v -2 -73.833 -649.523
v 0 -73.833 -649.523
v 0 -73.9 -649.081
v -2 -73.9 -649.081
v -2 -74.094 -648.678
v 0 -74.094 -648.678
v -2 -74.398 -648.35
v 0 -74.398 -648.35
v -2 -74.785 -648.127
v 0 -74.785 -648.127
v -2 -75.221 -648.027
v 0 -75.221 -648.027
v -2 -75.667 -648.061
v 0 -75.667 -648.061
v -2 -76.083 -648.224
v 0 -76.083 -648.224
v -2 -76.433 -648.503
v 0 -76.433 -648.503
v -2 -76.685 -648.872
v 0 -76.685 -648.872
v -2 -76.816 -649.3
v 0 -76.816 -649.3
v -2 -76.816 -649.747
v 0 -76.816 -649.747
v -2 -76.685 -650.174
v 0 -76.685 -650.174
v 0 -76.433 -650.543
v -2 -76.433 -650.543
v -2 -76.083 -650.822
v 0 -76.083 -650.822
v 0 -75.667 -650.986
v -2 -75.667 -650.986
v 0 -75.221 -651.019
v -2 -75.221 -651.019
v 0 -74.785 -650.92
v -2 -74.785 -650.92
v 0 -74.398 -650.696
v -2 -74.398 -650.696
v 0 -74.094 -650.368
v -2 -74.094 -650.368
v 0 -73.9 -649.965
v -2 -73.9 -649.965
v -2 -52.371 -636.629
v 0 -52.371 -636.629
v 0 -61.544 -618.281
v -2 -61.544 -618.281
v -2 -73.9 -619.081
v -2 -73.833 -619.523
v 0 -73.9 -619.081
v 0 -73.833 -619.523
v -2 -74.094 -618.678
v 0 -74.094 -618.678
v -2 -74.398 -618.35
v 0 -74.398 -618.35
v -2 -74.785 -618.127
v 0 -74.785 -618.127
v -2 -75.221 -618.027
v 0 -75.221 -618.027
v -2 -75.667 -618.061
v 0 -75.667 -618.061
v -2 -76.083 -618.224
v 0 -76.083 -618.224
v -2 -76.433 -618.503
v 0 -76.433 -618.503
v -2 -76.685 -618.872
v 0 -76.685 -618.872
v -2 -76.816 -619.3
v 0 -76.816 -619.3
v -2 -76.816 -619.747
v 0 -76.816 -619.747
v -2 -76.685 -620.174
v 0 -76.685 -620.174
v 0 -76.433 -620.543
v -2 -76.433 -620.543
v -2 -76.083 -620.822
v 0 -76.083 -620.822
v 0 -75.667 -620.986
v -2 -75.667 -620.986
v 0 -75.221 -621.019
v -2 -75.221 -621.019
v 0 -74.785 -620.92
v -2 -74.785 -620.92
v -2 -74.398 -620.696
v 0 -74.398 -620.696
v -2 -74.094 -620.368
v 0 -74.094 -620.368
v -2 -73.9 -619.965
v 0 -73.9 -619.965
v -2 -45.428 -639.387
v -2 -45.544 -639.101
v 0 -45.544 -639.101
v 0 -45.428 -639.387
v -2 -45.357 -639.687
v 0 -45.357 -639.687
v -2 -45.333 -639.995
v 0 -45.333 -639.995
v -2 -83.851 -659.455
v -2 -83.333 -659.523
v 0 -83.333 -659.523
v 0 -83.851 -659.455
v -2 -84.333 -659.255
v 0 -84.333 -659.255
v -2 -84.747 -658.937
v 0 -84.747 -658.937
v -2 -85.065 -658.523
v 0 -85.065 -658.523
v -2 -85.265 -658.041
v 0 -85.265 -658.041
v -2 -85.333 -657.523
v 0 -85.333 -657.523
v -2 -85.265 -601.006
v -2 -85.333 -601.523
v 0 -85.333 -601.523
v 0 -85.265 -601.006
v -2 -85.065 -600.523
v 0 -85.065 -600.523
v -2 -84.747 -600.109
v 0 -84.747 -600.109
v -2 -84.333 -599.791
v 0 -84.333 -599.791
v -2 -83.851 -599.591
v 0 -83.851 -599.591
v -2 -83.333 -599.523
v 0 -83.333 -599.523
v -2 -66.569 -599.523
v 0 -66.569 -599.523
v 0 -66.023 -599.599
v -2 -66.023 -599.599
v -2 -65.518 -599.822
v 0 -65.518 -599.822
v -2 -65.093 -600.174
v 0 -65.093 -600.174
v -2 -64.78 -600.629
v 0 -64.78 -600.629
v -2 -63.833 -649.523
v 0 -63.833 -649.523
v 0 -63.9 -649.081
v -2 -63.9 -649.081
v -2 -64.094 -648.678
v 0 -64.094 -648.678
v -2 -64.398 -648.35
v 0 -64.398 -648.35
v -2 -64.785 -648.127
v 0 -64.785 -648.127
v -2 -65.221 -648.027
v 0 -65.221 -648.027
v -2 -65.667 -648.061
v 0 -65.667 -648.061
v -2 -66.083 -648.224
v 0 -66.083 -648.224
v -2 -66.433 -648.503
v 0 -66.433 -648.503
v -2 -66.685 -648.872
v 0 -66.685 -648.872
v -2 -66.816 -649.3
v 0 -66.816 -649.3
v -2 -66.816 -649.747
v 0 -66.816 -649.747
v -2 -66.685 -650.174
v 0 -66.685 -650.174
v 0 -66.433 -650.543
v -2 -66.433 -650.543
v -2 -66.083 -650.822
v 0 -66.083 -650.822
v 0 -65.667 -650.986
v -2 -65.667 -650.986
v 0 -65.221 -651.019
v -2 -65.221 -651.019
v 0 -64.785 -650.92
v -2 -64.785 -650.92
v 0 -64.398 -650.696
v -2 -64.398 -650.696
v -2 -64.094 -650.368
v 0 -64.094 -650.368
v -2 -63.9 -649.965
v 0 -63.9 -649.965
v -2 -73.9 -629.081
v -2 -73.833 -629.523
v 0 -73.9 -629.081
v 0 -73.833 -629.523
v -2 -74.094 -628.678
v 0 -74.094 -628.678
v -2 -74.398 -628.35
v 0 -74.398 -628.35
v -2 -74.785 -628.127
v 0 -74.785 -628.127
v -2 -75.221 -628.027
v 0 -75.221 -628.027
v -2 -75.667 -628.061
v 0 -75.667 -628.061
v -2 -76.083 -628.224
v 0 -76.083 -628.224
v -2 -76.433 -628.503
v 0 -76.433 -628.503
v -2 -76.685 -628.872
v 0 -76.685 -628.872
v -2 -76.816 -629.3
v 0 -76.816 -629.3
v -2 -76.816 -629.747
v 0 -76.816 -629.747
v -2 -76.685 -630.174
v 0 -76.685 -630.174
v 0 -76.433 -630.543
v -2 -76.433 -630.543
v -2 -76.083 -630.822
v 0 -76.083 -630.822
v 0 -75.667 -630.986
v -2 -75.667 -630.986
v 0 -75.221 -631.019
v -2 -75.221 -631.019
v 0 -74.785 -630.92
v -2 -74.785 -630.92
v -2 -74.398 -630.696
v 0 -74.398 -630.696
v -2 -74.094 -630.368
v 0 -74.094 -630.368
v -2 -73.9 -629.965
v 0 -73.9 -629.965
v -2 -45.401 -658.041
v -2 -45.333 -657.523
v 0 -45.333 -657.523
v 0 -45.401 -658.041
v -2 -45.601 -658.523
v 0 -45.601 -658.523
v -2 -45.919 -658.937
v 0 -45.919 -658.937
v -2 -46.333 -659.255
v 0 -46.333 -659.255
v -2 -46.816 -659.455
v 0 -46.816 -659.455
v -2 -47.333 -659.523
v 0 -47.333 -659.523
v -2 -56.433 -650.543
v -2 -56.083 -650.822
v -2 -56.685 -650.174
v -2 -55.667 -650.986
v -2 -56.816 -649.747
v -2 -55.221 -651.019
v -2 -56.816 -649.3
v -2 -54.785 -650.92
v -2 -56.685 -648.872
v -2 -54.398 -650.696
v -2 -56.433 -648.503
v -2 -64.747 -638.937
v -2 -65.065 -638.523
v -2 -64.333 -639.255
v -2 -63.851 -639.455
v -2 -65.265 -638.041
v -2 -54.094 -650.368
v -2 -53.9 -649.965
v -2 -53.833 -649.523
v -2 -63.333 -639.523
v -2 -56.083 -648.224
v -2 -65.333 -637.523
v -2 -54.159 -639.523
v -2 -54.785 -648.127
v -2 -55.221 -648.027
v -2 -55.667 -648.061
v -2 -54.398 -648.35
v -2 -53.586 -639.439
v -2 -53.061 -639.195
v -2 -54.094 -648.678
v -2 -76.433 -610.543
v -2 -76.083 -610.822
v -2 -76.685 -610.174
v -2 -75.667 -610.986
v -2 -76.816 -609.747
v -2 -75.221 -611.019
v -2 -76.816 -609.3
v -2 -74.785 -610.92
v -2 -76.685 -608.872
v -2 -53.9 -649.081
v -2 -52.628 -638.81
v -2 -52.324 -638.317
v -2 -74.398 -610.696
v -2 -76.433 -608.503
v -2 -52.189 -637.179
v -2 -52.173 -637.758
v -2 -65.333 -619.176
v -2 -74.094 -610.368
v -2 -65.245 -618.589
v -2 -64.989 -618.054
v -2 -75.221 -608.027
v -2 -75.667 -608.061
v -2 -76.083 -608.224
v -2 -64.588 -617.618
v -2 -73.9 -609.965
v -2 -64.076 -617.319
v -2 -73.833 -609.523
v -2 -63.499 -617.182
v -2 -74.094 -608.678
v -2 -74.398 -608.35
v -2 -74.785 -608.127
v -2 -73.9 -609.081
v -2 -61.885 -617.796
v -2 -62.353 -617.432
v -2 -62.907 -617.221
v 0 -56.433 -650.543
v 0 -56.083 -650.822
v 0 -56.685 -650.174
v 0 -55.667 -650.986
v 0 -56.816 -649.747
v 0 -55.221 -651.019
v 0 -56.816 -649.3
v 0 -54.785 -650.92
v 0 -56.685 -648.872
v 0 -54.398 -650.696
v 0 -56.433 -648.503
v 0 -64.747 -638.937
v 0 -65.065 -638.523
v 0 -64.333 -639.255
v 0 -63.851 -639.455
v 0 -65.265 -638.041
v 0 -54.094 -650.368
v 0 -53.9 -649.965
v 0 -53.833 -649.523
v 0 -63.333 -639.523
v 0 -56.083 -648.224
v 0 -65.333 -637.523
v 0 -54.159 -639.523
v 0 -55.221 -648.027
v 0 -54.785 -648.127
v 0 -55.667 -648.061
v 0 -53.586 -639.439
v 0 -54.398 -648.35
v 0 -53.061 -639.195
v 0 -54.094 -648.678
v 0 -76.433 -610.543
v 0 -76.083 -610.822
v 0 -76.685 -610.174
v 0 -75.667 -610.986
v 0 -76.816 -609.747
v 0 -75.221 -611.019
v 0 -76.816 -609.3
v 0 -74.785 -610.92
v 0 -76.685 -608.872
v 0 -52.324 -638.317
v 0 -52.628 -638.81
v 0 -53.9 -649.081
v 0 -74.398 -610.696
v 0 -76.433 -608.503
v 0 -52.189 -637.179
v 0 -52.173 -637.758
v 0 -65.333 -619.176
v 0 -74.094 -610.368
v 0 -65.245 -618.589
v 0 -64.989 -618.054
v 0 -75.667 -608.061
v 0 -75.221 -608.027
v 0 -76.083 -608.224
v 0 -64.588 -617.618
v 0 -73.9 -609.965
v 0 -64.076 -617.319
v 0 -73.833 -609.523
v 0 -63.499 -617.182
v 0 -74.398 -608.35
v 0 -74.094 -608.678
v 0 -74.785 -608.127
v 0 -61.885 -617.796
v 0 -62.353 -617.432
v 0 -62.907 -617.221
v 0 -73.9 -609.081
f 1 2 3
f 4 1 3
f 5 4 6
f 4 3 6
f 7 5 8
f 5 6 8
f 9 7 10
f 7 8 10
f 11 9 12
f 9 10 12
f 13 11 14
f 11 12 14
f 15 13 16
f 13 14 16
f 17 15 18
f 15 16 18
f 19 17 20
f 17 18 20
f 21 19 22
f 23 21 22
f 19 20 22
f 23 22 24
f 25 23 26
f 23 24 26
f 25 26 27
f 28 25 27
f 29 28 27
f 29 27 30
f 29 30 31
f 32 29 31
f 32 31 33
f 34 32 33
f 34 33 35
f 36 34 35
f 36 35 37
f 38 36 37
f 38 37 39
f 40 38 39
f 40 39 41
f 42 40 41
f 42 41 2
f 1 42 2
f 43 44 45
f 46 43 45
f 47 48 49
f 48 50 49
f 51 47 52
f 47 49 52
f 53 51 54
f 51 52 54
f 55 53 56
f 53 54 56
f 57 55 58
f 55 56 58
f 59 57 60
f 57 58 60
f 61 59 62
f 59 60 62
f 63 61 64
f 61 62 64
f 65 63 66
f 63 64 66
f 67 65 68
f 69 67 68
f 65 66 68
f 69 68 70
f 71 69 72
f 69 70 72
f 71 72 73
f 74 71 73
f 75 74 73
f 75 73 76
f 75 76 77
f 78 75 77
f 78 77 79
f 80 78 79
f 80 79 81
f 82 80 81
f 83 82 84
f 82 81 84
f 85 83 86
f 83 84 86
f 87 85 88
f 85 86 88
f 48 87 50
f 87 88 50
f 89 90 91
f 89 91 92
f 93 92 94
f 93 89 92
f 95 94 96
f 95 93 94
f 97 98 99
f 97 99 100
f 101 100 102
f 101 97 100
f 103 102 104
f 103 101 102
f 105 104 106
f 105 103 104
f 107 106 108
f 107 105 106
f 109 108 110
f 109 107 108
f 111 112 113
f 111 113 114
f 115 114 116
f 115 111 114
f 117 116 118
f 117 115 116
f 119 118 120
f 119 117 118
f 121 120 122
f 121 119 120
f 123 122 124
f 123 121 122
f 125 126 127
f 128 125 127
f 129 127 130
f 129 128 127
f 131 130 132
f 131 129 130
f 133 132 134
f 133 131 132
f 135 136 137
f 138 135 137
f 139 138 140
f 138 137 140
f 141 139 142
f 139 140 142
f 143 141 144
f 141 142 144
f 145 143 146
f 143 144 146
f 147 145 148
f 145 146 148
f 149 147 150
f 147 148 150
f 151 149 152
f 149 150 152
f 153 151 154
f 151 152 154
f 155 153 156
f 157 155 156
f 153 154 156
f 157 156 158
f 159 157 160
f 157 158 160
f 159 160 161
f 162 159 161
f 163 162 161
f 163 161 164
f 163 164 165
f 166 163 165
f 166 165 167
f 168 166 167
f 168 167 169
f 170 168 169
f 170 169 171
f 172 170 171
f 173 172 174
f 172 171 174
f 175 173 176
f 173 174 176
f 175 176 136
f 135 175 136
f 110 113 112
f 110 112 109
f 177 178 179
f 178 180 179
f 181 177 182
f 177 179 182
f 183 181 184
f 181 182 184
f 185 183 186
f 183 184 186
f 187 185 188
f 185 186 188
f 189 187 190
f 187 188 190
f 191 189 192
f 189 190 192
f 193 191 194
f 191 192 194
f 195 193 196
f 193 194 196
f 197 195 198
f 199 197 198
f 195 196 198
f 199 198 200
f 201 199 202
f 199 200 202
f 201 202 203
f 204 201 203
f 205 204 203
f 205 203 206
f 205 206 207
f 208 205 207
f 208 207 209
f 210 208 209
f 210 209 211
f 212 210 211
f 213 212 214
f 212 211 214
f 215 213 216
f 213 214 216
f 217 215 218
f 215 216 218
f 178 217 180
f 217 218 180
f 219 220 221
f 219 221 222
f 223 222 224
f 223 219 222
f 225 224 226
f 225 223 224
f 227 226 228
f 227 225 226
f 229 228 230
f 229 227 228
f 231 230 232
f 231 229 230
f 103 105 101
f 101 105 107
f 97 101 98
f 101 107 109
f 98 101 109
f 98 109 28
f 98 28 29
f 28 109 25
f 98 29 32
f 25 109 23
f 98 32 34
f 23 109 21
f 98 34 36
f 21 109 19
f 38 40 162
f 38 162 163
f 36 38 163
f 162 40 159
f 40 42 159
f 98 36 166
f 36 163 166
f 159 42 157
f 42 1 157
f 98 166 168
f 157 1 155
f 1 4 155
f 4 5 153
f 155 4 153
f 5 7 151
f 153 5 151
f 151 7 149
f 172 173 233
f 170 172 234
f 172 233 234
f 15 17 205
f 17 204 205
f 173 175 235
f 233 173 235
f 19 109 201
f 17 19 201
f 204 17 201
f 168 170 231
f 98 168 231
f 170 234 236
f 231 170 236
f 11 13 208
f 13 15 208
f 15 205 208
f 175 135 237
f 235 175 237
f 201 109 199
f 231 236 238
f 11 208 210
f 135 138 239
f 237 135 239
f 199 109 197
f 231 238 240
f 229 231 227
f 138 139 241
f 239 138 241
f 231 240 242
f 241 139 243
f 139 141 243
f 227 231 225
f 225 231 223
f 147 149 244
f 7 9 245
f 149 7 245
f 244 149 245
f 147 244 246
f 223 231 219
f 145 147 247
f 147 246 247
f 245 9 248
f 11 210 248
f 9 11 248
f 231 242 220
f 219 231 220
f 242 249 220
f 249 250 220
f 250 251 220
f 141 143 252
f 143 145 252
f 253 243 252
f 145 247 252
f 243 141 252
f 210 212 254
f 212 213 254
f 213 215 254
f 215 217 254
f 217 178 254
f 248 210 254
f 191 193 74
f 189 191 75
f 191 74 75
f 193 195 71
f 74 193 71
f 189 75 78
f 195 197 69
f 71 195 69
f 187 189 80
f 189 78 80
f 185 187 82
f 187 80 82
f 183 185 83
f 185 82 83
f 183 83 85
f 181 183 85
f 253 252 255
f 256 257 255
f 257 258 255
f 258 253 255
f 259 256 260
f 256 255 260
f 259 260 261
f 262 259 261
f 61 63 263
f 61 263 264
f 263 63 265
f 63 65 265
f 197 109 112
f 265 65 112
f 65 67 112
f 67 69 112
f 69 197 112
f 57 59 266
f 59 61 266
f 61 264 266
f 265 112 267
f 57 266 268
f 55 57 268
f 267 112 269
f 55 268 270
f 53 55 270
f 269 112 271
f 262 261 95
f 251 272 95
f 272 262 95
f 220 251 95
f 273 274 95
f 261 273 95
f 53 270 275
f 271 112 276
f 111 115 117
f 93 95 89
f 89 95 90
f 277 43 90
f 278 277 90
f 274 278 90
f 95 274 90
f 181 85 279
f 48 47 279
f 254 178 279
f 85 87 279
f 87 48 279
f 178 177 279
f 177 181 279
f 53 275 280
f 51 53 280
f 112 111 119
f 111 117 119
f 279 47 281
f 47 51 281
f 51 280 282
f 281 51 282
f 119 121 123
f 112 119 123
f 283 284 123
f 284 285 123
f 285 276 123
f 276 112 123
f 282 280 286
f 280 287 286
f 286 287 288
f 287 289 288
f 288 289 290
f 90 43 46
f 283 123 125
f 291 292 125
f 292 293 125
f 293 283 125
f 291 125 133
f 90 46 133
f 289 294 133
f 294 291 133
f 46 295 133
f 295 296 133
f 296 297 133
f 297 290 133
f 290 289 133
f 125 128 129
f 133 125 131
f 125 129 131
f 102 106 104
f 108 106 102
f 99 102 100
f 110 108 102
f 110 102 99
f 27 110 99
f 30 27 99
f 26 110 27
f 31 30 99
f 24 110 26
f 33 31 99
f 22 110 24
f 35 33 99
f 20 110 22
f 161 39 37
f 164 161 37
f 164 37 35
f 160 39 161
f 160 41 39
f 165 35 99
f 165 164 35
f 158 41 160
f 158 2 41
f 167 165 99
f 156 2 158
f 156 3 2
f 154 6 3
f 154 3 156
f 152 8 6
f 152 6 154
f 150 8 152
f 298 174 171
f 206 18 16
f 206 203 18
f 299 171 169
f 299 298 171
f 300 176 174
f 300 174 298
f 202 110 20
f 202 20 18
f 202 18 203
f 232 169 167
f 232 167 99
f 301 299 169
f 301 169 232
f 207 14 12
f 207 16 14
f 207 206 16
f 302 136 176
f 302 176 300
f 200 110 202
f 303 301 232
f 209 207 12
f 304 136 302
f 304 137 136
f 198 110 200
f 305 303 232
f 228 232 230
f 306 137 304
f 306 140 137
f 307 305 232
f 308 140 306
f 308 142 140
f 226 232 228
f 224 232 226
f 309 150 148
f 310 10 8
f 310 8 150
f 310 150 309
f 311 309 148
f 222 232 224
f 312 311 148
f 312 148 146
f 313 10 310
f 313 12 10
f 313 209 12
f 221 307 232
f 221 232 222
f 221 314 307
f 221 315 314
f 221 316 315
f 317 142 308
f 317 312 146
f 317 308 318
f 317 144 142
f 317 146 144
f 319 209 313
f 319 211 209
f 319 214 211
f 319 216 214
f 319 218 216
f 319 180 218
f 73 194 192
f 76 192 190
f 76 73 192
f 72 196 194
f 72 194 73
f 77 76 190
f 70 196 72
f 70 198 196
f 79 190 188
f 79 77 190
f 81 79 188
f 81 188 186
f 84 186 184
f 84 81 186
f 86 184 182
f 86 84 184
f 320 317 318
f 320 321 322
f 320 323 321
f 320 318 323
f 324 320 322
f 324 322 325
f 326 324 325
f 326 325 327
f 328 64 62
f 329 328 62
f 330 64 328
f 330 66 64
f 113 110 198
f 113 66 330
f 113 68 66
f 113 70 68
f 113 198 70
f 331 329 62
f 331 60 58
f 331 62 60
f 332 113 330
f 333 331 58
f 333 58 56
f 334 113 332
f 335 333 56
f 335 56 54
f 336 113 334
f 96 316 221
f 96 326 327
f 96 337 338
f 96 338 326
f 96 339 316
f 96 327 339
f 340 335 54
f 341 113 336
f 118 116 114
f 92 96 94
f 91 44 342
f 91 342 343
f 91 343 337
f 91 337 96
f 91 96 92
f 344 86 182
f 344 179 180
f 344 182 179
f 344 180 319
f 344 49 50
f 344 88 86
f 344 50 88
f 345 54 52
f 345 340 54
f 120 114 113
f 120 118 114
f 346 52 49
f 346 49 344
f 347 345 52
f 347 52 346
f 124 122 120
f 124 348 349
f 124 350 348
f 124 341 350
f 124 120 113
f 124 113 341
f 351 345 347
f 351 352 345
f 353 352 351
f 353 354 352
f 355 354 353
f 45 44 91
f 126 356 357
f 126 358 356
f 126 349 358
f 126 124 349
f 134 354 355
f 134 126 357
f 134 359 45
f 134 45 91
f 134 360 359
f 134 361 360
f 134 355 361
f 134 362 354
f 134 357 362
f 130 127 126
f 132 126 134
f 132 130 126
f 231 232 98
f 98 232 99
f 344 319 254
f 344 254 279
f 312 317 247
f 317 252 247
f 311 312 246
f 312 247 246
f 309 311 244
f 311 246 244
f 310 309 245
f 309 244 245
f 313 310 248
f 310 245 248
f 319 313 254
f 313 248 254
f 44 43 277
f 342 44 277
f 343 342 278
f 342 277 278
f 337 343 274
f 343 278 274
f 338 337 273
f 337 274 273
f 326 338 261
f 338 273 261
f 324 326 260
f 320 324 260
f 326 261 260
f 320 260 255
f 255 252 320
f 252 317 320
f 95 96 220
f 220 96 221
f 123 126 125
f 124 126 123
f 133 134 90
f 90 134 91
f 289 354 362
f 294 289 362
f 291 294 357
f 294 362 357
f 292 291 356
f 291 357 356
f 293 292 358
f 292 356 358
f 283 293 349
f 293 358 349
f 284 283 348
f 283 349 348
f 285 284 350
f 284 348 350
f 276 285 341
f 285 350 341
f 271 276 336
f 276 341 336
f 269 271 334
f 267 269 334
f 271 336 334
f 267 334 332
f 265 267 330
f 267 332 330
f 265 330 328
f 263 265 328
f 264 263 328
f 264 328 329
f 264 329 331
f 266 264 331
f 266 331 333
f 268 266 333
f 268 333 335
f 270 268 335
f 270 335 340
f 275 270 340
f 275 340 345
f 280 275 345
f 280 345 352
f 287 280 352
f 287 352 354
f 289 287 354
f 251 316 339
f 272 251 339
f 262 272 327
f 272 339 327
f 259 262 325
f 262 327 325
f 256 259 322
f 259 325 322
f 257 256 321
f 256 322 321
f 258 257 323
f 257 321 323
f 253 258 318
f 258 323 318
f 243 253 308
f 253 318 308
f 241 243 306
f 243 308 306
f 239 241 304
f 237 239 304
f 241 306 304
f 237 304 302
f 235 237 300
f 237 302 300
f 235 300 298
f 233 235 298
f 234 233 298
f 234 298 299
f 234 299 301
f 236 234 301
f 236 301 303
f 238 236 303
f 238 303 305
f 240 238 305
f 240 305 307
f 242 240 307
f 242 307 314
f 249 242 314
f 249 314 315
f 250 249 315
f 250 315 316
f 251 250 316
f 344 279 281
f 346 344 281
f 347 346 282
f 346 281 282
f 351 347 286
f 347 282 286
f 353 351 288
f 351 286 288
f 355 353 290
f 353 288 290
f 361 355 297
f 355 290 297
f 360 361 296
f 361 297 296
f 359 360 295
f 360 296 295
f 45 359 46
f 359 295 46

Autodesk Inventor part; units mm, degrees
ref_plane "YZ Plane" through (0, 0, 0) normal (1, 0, 0) x (0, 1, 0)
ref_plane "XZ Plane" through (0, 0, 0) normal (0, 1, 0) x (-1, 0, 0)
ref_plane "XY Plane" through (0, 0, 0) normal (0, 0, 1) x (1, 0, 0)
sketch "スケッチ1" plane through (0, 0, 0) normal (1, 0, 0) x (0, 1, 0)
  line L0 (-65.3332, -639.5232) -> (-65.3332, 668.4768)
  line L1 (-65.3332, -537.5232) -> (339.6668, -537.5232)
  line L2 (339.6668, -537.5232) -> (339.6668, -517.5232)
  line L3 (339.6668, -517.5232) -> (-65.3332, -517.5232)
  line L4 (-65.3332, -517.5232) -> (-65.3332, -537.5232)
  circle A0 centre (-30.1532, -490.5232) radius 21
  circle A1 centre (-30.1532, -448.5232) radius 16
  circle A2 centre (-30.1532, -448.5232) radius 13.68
  line L5 (-85.3332, -639.5232) -> (-65.3332, -639.5232)
  line L6 (-85.3332, -639.5232) -> (-65.3332, -639.5232)
  line L7 (-85.3332, -639.5232) -> (398.6668, -639.5232)
  line L8 (398.6668, -639.5232) -> (398.6668, -659.5232)
  line L9 (398.6668, -659.5232) -> (-85.3332, -659.5232)
  line L10 (-85.3332, -659.5232) -> (-85.3332, -639.5232)
  line L11 (-10.1532, 668.4768) -> (9.0226, 674.1594)
  line L12 (9.0226, 674.1594) -> (394.8699, -627.872)
  line L13 (394.8699, -627.872) -> (375.6942, -633.5546)
  line L14 (375.6942, -633.5546) -> (-10.1532, 668.4768)
  line L15 (-85.3332, 668.4768) -> (-85.3332, -639.5232)
  line L16 (-85.3332, -432.5232) -> (-30.1532, -432.5232)
  line L17 (-9.1532, -490.5232) -> (-9.1532, -537.5232)
  line L18 (-9.1532, -490.5232) -> (-9.1532, -432.5232)
  line L19 (-9.1532, -432.5232) -> (-30.1532, -432.5232)
  circle A3 centre (-75.3332, -444.5232) radius 1.5
  circle A4 centre (-75.3332, -454.5232) radius 1.5
  line L20 (-30.1532, -464.5232) -> (-85.3332, -464.5232)
  circle A5 centre (-55.3332, -527.5232) radius 1.5
  circle A6 centre (-35.3332, -527.5232) radius 1.5
  line L21 (-65.3332, -537.5232) -> (-85.3332, -537.5232)
  circle A7 centre (-75.3332, -527.5232) radius 1.5
  circle A8 centre (-75.3332, -507.5232) radius 1.5
  circle A9 centre (-30.1532, 652.4768) radius 16
  line L22 (-65.3332, 668.4768) -> (-85.3332, 668.4768)
  line L23 (-85.3332, 668.4768) -> (-30.1532, 668.4768)
  line L24 (-30.1532, 636.4768) -> (-85.3332, 636.4768)
  line L25 (-30.1532, 668.4768) -> (-10.1532, 668.4768)
  circle A10 centre (-30.1532, 652.4768) radius 7.5
  line L26 (-30.1532, 636.4768) -> (-0.6702, 636.4768)
  circle A11 centre (-75.3332, 656.4768) radius 1.5
  circle A12 centre (-75.3332, 646.4768) radius 1.5
  circle A13 centre (2.276, 661.7302) radius 1.5
  circle A14 centre (5.1173, 652.1424) radius 1.5
  line L27 (-0.6702, 636.4768) -> (18.5055, 642.1594)
  line L28 (-65.3332, -599.5232) -> (-45.3332, -639.5232)
  line L29 (-45.3332, -639.5232) -> (-45.3332, -659.5232)
  line L30 (-65.3332, -599.5232) -> (-85.3332, -599.5232)
  circle A15 centre (-75.3332, -629.5232) radius 1.5
  circle A16 centre (-75.3332, -619.5232) radius 1.5
  circle A17 centre (-75.3332, -609.5232) radius 1.5
  circle A18 centre (-75.3332, -649.5232) radius 1.5
  circle A19 centre (-65.3332, -649.5232) radius 1.5
  circle A20 centre (-55.3332, -649.5232) radius 1.5
  line L31 (-85.3332, -639.5232) -> (-85.3332, -599.5232)
  line L32 (368.6668, -639.5232) -> (368.6668, -659.5232)
  line L33 (367.1703, -604.7911) -> (386.346, -599.1085)
  line L34 (375.6942, -633.5546) -> (377.4629, -639.5232)
  line L35 (394.8699, -627.872) -> (398.6668, -639.5232)
  circle A21 centre (378.6668, -649.5232) radius 1.5
  circle A22 centre (388.6668, -649.5232) radius 1.5
  circle A23 centre (382.4407, -621.1255) radius 1.5
  circle A24 centre (379.5994, -611.5376) radius 1.5
  circle A25 centre (319.6668, -527.5232) radius 1.5
  circle A26 centre (329.6668, -527.5232) radius 1.5
  line L36 (339.6668, -517.5232) -> (341.3091, -517.5232)
  line L37 (339.6668, -537.5232) -> (347.236, -537.5232)
  line L38 (341.3091, -517.5232) -> (362.1688, -517.5232)
  circle A27 centre (354.5961, -527.1644) radius 1.5
  circle A28 centre (357.4374, -536.7523) radius 1.5
  line L39 (350.6908, -549.1815) -> (369.8665, -543.4989)
  line L40 (309.6668, -517.5232) -> (309.6668, -537.5232)
  line L41 (-50.3332, -659.5232) -> (-50.3332, -640.7035)
  line L42 (-50.3332, -640.7035) -> (-68.4233, -604.5232)
  line L43 (-68.4233, -604.5232) -> (-80.3332, -604.5232)
  line L44 (-80.3332, -604.5232) -> (-80.3332, -639.5232)
  point P0 (0, 0)
  point P1 (-388.3332, -207.1898)
  point P2 (-65.3332, -517.5232)
  point P3 (385.282, -630.7133)
  point P4 (-50.9233, -639.5232)
  point P5 (-65.3332, -610.7035)
  dimension "d1" = 42
  dimension "d0" = 20
  dimension "d2" = 32
  dimension "d3" = 27.36
  dimension "d4" = 35.18
  dimension "d5" = 35.18
  dimension "d6" = 27
  dimension "d7" = 42
  dimension "d8" = 191
  dimension "d9" = 20
  dimension "d10" = 484
  dimension "d11" = 3
  dimension "d12" = 3
  dimension "d13" = 10
  dimension "d14" = 10
  dimension "d15" = 10
  dimension "d16" = 10
  dimension "d17" = 3
  dimension "d18" = 3
  dimension "d19" = 10
  dimension "d20" = 20
  dimension "d21" = 10
  dimension "d22" = 10
  dimension "d23" = 3
  dimension "d24" = 3
  dimension "d25" = 10
  dimension "d26" = 20
  dimension "d27" = 10
  dimension "d28" = 10
  dimension "d29" = 20
  dimension "d30" = 32
  dimension "d31" = 35.18
  dimension "d32" = 20
  dimension "d33" = 1358
  dimension "d34" = 91.543
  dimension "d35" = 405
  dimension "d36" = 15
  dimension "d37" = 3
  dimension "d38" = 3
  dimension "d39" = 10
  dimension "d40" = 10
  dimension "d41" = 10
  dimension "d42" = 10
  dimension "d43" = 3
  dimension "d44" = 3
  dimension "d45" = 10
  dimension "d46" = 10
  dimension "d47" = 10
  dimension "d48" = 10
  dimension "d49" = 40
  dimension "d50" = 3
  dimension "d51" = 3
  dimension "d52" = 3
  dimension "d53" = 3
  dimension "d54" = 3
  dimension "d55" = 3
  dimension "d56" = 10
  dimension "d57" = 10
  dimension "d58" = 10
  dimension "d59" = 10
  dimension "d60" = 10
  dimension "d61" = 10
  dimension "d62" = 10
  dimension "d63" = 10
  dimension "d64" = 10
extrude "押し出し1" add sketch "スケッチ1" against normal blind 2 contours L28 L7 L42 L0 | L0 L42 L43 L44 L5 L15 L30 | L42 L7 L0 | L0 L5 L44 L43 L42 | L29 L9 L41 L42 L7 | L7 L42 L41 L9 L10 L5
extrude "押し出し2" cut sketch "スケッチ1" against normal blind 2 contours L42 L7 L0
fillet "フィレット1" radius 2 8 edges at (-1, -85.3332, -599.5232) (-1, -65.3332, -599.5232) (-1, -65.3332, -610.7035) (-1, -65.3332, -639.5232) (-1, -50.9233, -639.5232) (-1, -45.3332, -639.5232) (-1, -45.3332, -659.5232) (-1, -85.3332, -659.5232)
equation "\"d5\" = d4"
equation "\"d14\" = d15"
equation "\"d21\" = d19"
equation "\"d22\" = d19"
equation "\"d27\" = d25"
equation "\"d28\" = d25"
equation "\"d31\" = d4"
equation "\"d41\" = d39"
equation "\"d42\" = d39"
equation "\"d46\" = d45"
equation "\"d47\" = d45"
equation "\"d48\" = d45"
equation "\"d57\" = d56"
equation "\"d58\" = d56"
equation "\"d59\" = d56"
equation "\"d60\" = d56"
equation "\"d61\" = d56"
equation "\"d62\" = d56"
equation "\"d63\" = d56"
equation "\"d64\" = d62"
properties part number "dribl-v1-Plate-9" material "アルミニウム 6061"
